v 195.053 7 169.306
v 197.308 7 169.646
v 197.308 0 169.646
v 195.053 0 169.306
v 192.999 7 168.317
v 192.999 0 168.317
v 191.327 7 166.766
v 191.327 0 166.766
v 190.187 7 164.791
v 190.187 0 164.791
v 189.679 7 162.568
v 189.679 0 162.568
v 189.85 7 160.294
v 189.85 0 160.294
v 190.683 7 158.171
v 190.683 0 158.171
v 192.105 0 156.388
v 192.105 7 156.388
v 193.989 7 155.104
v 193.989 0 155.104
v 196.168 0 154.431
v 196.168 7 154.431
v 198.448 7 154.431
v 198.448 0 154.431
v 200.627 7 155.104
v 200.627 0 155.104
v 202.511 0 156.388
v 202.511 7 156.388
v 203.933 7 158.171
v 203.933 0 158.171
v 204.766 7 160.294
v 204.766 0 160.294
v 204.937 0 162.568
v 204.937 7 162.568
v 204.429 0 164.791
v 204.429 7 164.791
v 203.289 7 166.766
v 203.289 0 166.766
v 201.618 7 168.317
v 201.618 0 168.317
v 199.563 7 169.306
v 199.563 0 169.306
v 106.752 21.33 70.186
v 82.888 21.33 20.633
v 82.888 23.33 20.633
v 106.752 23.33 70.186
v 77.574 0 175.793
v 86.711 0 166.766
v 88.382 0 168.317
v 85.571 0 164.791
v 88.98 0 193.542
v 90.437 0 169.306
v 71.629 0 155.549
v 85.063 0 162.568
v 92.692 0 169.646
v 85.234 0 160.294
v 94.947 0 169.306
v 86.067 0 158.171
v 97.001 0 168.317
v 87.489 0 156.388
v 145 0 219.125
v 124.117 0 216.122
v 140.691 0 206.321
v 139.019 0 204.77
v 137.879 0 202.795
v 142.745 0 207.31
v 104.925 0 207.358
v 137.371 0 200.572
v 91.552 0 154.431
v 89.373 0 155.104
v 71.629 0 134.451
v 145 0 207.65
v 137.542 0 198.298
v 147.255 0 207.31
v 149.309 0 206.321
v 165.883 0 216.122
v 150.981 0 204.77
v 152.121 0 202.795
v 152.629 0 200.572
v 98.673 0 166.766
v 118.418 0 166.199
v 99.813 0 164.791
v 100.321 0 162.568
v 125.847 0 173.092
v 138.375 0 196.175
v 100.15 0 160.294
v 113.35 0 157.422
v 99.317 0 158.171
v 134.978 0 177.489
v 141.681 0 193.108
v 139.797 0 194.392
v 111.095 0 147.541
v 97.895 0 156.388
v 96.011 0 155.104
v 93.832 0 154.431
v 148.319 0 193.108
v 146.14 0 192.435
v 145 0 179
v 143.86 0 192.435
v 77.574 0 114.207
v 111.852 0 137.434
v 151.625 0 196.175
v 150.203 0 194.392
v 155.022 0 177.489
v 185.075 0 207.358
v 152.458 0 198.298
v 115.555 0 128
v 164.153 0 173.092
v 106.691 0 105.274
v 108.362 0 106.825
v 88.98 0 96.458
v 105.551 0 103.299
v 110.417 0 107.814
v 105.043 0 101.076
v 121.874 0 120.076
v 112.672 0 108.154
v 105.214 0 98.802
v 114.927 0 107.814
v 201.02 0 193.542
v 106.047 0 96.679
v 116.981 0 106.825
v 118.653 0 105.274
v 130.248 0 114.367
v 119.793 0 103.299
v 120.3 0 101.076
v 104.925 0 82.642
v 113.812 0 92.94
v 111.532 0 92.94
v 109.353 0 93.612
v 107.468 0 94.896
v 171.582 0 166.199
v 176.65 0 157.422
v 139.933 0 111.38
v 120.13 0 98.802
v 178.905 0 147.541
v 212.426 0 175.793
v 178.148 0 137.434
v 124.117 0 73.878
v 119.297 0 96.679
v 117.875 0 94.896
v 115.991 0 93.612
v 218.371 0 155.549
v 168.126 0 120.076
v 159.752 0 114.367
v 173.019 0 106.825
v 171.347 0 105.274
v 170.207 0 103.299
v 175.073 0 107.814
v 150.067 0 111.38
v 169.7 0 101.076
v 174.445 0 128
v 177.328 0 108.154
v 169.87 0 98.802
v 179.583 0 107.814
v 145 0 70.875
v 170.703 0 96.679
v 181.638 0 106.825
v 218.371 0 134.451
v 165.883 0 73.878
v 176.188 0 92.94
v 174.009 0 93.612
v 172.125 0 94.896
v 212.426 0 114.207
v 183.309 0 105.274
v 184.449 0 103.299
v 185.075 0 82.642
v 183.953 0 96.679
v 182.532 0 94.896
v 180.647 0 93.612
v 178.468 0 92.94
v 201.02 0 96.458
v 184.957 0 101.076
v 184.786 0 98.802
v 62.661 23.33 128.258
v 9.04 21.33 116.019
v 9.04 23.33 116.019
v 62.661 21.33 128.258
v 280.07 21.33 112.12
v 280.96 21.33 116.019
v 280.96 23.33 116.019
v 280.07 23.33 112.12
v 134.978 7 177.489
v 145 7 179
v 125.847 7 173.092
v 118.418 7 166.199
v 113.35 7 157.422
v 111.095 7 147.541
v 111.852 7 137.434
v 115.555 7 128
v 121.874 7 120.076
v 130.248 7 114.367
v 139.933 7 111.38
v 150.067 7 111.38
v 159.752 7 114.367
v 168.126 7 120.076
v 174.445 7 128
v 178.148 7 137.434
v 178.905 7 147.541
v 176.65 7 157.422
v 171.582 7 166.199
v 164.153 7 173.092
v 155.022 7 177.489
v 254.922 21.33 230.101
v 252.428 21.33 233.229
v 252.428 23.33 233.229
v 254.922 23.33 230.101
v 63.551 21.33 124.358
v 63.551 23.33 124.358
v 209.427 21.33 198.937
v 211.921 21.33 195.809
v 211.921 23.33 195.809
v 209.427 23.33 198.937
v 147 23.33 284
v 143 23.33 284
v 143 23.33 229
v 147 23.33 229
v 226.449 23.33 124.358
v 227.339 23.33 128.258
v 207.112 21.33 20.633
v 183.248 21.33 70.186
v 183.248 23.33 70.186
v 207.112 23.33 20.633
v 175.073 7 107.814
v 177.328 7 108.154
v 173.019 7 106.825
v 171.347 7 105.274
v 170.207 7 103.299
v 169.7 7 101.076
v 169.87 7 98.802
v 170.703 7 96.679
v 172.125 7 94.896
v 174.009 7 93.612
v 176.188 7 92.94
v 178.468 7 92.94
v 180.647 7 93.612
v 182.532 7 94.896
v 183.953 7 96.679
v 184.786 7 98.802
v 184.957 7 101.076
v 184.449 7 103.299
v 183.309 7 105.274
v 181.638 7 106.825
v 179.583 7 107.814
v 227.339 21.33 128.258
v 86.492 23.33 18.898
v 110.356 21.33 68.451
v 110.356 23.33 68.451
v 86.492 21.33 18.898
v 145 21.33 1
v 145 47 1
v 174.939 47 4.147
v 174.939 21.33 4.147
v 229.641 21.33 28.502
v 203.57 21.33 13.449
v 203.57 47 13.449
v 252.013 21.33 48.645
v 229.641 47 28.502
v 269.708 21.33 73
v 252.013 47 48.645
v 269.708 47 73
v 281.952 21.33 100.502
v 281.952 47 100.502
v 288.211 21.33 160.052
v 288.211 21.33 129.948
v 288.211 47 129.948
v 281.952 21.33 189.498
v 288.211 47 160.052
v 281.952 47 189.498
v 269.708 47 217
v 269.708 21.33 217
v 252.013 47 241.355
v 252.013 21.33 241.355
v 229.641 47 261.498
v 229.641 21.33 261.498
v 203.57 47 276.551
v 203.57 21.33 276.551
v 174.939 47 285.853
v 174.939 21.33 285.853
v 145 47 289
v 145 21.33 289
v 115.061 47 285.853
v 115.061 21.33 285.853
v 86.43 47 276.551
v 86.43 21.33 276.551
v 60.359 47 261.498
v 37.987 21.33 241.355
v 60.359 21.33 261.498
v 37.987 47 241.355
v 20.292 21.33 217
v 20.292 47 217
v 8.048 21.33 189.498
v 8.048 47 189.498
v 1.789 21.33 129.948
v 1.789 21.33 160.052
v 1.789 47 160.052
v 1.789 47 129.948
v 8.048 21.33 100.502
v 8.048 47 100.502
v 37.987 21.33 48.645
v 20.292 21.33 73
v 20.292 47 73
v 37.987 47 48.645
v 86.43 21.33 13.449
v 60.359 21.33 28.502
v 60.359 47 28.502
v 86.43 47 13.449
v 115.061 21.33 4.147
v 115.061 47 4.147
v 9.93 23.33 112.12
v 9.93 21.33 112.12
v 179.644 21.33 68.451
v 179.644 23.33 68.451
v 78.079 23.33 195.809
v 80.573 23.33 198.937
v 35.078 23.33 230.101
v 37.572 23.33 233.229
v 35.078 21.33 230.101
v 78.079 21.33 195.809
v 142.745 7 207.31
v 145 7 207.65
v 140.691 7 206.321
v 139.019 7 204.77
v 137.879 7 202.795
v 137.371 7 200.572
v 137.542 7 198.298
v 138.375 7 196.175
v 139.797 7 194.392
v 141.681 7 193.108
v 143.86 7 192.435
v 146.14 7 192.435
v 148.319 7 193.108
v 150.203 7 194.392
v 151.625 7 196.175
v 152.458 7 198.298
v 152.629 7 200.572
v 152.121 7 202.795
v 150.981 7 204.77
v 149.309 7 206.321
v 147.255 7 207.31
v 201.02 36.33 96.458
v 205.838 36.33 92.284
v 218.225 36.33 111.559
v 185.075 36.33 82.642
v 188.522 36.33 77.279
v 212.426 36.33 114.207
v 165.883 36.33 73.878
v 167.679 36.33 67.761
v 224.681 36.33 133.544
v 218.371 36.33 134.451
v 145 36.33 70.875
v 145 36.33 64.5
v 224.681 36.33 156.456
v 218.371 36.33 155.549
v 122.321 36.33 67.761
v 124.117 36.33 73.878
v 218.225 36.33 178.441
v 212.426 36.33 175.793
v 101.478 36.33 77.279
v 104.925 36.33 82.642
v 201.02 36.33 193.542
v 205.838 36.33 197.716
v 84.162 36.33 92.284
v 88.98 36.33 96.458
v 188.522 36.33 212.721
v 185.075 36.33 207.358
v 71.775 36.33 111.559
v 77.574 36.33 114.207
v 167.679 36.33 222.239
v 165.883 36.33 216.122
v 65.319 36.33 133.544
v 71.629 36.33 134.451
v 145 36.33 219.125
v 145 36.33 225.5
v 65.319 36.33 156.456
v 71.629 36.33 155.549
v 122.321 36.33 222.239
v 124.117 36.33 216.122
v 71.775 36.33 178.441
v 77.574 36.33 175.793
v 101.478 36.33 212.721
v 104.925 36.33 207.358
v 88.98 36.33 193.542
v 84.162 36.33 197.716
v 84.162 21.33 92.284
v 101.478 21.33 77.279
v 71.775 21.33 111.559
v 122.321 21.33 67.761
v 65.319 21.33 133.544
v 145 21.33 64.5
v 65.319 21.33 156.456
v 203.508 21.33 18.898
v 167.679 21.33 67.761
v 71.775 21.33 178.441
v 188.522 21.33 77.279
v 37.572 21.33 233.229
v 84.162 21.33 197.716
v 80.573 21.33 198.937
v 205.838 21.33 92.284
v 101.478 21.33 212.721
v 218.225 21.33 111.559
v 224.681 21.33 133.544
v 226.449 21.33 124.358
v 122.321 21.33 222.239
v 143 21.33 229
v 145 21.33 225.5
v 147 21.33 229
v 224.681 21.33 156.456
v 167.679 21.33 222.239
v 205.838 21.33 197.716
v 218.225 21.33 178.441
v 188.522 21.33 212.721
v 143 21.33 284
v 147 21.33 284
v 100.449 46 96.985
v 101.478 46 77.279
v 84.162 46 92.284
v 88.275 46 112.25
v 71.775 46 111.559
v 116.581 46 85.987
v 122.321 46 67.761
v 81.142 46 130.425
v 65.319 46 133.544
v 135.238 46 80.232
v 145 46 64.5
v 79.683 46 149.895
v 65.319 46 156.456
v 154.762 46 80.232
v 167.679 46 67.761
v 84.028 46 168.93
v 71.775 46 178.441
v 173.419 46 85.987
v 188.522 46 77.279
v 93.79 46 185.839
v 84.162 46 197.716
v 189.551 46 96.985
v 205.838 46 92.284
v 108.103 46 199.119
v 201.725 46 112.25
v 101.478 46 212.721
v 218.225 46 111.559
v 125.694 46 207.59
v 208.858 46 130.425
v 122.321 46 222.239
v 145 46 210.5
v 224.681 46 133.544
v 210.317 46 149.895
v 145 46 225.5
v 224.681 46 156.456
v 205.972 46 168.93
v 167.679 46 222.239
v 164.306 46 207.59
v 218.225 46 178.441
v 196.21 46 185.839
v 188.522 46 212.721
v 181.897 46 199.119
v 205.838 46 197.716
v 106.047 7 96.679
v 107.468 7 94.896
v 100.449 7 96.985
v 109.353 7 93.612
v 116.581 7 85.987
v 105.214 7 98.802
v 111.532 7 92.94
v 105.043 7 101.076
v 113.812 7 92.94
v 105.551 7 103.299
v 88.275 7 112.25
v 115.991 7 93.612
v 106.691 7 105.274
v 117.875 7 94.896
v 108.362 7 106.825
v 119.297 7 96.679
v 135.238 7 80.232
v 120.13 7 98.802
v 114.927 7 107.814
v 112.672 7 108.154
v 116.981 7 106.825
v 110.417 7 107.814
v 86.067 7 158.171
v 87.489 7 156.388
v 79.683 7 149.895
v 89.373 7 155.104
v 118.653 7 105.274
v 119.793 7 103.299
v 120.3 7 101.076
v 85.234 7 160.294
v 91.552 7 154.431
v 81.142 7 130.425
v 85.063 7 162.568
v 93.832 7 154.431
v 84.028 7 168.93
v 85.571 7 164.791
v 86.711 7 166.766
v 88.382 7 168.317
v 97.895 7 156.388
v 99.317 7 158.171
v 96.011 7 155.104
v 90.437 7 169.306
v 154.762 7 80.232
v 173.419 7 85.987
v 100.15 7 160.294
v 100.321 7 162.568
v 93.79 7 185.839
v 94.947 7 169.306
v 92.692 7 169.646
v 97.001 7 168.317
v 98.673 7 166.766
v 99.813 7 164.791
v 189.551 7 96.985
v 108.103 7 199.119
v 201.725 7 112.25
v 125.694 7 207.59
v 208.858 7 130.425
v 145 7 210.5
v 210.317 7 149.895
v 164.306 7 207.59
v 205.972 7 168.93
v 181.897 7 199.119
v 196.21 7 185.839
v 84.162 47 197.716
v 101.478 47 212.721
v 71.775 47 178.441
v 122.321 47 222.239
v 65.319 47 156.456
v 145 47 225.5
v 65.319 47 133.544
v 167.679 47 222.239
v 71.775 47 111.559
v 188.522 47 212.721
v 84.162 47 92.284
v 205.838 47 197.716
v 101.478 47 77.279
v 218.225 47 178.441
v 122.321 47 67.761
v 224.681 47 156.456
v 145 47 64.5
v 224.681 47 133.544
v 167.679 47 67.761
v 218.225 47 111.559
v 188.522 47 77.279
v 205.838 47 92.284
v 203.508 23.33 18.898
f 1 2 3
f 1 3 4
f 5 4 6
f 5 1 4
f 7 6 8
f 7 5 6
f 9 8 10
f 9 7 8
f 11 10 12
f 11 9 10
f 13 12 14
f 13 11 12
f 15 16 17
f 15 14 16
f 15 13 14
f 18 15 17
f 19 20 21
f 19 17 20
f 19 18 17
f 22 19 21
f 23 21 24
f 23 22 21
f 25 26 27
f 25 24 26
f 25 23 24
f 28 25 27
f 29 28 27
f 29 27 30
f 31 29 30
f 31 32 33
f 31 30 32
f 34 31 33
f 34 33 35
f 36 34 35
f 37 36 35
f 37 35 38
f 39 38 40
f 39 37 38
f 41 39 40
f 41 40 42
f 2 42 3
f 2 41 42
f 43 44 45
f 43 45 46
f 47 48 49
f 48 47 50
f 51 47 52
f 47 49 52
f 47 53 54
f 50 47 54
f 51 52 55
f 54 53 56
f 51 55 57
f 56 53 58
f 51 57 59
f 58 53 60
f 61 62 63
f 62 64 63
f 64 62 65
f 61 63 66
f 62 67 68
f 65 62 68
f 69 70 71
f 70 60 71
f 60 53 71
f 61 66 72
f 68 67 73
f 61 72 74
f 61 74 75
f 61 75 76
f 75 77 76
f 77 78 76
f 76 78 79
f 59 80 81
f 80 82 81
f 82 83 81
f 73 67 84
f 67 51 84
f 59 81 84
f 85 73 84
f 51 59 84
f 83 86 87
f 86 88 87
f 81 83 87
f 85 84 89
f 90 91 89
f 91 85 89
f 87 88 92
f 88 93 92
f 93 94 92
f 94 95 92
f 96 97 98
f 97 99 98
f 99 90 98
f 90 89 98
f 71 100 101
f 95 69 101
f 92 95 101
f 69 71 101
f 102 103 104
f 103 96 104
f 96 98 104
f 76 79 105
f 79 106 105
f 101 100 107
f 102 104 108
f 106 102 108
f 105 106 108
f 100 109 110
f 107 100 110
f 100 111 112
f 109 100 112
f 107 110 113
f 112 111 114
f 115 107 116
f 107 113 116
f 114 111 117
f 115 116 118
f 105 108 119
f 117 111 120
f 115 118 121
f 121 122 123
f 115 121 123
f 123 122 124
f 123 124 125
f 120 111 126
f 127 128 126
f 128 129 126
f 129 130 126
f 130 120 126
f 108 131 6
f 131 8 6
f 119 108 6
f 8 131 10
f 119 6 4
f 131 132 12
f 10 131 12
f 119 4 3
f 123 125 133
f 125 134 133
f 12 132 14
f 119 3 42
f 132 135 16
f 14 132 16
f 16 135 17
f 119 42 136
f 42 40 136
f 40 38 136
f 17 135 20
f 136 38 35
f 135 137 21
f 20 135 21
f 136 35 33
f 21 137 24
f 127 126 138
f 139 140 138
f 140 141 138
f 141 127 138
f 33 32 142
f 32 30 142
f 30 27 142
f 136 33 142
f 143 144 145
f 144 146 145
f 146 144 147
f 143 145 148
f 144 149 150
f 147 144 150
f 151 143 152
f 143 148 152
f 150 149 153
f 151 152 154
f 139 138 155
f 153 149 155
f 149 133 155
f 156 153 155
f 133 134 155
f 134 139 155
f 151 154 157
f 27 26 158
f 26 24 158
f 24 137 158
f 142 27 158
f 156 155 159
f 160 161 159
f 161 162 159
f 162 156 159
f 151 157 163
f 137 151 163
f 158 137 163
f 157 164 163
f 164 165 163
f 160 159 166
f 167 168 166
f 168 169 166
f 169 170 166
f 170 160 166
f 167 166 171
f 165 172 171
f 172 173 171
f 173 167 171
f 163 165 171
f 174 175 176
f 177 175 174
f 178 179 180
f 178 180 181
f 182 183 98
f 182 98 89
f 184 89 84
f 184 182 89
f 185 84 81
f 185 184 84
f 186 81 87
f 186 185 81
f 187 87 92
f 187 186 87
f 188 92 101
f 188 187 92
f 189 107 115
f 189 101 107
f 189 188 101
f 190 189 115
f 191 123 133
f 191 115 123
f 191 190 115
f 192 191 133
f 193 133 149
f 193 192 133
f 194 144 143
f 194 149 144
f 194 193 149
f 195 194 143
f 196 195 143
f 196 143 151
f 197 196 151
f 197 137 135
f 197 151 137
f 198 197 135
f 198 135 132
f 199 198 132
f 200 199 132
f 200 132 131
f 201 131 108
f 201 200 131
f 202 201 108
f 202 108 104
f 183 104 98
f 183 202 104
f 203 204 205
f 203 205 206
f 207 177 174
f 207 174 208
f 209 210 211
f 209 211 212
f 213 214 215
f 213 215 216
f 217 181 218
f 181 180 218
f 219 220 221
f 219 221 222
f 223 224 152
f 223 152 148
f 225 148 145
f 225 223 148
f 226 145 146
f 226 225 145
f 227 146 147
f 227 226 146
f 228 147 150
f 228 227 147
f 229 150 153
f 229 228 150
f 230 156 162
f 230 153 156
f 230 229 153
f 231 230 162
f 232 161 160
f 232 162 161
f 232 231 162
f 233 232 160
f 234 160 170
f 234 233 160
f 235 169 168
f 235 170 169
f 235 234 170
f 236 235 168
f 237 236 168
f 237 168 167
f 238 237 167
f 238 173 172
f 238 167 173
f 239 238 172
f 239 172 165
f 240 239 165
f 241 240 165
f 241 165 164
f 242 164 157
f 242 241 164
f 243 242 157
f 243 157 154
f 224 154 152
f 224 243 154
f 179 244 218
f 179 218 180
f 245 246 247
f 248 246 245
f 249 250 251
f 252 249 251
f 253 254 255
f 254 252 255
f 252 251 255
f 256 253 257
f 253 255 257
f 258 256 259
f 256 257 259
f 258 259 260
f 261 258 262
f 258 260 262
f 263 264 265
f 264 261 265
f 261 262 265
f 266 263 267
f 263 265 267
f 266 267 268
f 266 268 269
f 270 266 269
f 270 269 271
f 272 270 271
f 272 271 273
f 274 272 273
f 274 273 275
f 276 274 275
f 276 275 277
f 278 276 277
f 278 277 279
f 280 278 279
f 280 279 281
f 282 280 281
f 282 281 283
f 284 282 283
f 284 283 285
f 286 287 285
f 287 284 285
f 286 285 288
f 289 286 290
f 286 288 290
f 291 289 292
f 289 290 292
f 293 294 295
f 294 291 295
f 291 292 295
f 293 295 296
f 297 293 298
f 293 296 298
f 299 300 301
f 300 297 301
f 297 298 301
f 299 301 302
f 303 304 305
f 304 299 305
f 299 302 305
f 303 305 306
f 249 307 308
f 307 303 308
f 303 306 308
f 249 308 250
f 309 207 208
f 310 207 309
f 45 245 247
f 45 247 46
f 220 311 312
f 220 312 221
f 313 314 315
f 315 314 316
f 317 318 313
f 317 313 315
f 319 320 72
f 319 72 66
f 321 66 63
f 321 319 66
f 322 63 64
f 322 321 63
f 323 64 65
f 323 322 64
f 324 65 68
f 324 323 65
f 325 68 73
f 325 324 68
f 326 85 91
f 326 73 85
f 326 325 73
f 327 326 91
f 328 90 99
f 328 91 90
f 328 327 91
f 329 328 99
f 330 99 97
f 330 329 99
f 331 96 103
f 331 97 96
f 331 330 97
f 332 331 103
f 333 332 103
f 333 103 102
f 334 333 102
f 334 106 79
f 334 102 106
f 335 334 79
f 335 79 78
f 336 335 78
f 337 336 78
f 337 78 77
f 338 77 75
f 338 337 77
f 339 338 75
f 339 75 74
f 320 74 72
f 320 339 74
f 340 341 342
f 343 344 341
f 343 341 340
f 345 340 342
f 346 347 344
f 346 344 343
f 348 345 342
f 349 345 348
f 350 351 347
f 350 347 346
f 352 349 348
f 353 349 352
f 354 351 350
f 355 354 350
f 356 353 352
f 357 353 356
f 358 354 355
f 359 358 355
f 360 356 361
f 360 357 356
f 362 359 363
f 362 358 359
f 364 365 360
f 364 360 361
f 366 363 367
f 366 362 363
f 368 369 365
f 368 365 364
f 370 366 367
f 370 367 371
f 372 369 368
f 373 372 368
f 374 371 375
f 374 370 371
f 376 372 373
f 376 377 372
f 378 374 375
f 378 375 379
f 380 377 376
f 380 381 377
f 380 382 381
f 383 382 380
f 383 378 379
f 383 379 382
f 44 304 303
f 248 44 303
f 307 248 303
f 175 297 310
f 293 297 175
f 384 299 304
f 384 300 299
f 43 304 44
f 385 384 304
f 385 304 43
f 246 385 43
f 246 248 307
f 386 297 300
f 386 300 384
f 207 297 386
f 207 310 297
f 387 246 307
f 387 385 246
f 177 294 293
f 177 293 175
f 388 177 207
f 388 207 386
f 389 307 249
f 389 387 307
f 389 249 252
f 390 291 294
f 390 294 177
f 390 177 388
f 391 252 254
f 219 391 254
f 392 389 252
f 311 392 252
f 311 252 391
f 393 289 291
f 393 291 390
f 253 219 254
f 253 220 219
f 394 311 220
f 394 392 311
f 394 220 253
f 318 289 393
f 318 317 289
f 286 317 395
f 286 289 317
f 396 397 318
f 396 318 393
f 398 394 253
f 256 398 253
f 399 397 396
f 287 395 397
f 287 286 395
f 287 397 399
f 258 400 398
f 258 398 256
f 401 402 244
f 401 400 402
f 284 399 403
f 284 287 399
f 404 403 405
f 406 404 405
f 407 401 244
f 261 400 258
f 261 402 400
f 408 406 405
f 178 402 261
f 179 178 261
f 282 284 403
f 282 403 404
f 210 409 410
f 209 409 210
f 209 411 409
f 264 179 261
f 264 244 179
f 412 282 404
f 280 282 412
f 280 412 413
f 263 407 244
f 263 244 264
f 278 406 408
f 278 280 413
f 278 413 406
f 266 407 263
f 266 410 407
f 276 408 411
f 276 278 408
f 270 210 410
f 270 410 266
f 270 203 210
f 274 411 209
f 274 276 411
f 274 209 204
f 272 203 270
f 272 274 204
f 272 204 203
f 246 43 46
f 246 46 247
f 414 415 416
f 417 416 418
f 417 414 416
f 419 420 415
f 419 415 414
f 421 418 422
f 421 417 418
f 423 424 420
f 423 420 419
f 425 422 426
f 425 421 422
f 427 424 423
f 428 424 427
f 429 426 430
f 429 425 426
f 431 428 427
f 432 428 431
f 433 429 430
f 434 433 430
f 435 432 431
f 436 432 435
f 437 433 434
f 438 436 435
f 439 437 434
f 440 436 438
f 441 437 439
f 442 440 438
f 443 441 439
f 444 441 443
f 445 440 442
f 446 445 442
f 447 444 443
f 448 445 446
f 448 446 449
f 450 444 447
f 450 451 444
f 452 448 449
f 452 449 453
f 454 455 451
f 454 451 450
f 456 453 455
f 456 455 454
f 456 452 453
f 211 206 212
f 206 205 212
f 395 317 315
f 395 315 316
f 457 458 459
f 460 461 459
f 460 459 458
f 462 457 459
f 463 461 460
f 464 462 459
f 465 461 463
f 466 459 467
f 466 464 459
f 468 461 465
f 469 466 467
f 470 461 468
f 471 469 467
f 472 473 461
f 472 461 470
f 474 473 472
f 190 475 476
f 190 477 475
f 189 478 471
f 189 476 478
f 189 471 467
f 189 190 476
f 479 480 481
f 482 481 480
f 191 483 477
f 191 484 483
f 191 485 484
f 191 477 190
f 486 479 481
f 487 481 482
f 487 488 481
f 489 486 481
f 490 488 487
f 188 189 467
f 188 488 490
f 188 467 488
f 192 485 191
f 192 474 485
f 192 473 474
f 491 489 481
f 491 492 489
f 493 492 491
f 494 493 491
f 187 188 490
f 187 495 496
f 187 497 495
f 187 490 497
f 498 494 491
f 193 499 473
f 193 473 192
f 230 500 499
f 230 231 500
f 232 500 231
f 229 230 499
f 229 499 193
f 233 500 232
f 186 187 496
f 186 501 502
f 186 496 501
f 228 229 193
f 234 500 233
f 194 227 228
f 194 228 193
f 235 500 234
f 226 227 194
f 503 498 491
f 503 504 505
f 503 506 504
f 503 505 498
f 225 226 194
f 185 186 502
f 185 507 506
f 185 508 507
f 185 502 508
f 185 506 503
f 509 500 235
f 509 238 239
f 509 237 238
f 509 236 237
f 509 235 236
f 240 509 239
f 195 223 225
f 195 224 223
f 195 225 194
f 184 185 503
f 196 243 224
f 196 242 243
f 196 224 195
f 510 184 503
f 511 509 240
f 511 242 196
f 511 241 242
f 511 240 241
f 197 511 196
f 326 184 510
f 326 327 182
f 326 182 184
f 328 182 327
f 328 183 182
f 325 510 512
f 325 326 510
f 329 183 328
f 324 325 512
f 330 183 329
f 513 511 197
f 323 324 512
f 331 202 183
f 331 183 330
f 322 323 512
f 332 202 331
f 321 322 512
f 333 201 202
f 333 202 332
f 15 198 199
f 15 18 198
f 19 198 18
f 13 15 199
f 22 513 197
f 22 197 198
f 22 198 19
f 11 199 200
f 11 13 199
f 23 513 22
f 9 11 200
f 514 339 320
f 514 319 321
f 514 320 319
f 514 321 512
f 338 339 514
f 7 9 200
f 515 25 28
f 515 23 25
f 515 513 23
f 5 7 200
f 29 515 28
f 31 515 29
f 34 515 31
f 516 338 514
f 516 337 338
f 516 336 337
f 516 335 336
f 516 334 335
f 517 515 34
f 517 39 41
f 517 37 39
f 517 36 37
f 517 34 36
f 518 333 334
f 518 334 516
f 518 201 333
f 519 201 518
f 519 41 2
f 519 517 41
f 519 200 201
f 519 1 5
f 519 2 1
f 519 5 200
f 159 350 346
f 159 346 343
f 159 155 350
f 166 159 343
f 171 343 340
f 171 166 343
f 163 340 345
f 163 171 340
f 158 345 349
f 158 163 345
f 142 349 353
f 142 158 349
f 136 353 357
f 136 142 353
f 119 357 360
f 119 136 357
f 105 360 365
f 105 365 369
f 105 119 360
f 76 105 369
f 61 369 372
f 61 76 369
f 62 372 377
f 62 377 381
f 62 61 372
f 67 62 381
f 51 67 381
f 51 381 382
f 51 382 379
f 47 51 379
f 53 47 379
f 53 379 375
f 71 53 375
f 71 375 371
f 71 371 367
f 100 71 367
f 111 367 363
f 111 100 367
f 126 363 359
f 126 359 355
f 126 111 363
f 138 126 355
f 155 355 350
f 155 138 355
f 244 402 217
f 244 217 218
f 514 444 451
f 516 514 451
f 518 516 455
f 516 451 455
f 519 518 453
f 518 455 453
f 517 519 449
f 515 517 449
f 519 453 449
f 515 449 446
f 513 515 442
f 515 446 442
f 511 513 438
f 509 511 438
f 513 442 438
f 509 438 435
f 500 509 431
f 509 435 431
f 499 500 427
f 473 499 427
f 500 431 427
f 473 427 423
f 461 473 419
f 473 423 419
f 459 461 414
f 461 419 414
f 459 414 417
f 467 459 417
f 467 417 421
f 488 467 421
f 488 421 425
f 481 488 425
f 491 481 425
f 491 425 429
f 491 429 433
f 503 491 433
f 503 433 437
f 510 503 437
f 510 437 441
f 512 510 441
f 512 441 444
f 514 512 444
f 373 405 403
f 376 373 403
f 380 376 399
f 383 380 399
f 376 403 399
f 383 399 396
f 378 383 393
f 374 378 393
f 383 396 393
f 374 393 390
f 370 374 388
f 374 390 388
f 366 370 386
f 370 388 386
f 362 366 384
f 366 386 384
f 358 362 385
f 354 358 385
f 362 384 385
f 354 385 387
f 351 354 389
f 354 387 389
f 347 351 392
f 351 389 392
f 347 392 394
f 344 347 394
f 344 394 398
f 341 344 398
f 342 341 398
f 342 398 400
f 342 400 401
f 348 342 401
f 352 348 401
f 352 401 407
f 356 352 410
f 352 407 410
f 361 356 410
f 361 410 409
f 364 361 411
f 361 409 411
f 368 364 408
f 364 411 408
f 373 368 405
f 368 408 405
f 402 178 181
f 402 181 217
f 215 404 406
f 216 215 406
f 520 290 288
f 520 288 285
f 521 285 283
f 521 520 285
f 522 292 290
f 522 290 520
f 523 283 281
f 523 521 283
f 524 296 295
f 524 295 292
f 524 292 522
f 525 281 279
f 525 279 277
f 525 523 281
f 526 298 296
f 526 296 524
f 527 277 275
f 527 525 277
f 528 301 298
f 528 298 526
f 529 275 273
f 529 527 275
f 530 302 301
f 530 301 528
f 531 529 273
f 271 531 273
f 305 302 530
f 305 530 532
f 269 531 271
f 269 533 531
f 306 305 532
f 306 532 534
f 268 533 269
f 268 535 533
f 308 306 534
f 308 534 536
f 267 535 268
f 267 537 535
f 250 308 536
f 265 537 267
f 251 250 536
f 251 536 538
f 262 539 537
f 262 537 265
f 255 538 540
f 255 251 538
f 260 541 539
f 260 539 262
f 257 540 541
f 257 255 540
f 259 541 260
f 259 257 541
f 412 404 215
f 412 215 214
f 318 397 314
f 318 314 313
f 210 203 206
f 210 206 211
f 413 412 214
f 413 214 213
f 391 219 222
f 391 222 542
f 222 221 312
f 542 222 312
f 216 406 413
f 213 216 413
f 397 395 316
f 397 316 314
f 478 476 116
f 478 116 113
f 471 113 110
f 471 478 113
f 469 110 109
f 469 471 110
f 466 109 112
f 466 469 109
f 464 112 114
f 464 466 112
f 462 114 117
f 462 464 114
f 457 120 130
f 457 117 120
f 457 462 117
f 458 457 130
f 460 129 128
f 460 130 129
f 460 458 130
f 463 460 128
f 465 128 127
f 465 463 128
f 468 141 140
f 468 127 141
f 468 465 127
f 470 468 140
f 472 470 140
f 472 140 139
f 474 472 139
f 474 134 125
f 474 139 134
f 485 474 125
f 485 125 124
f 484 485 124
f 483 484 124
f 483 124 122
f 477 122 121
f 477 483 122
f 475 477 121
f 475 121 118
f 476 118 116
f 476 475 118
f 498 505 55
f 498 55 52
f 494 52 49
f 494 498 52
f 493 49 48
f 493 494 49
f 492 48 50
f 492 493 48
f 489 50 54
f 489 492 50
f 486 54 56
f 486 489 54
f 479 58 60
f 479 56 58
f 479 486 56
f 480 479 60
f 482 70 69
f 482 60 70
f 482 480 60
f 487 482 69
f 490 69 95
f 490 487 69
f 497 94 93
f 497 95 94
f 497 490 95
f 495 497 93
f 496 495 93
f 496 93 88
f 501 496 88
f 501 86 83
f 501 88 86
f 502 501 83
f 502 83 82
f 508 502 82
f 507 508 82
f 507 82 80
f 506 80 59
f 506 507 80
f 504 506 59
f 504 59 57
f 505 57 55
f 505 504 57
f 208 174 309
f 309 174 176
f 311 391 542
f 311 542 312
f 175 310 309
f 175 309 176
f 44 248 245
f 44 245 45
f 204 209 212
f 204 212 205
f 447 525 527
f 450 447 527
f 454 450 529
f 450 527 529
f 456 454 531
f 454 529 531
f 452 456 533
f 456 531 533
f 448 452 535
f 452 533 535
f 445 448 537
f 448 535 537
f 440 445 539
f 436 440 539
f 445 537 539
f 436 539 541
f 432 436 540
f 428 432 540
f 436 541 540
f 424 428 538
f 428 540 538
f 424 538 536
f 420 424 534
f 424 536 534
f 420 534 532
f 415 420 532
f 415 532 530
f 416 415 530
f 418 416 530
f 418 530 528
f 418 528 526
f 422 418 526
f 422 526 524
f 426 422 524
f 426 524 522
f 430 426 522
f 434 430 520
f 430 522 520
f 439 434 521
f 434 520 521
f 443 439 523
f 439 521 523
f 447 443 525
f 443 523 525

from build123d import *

# Parameters (mm, degrees)
SKETCH1_W               = 290
SKETCH1_H               = 290
BOSS_EXTRUDE1_DEPTH     = 47
SKETCH2_R               = 65.5
CUT_EXTRUDE1_DEPTH      = 40
SKETCH3_R               = 80.5
CUT_EXTRUDE2_DEPTH      = 1
SKETCH4_OUTSIDE_W       = 374.562
SKETCH4_OUTSIDE_H       = 374.562
SKETCH4_OUTSIDE_R       = 74.125
CUT_EXTRUDE3_DEPTH      = 21.33
CUT_EXTRUDE4_DEPTH      = 413.806249953
CUT_EXTRUDE4_DEPTH_BACK = 413.806249953
SKETCH5_R               = 34
CUT_EXTRUDE5_DEPTH      = 413.806249953
CUT_EXTRUDE5_DEPTH_BACK = 413.806249953
SKETCH6_R               = 7.65
SKETCH7_R               = 80.5
SKETCH7_R_2             = 74.125
CUT_EXTRUDE6_DEPTH      = 15
SKETCH8_W               = 4
SKETCH8_H               = 55
CUT_EXTRUDE7_DEPTH      = 2
CUT_EXTRUDE8_DEPTH      = 411.92450511
CUT_EXTRUDE8_DEPTH_BACK = 411.92450511
SKETCH9_OUTSIDE_W       = 374.562
SKETCH9_OUTSIDE_H       = 374.562
SKETCH9_OUTSIDE_R       = 144


with BuildPart() as part:
    # Sketch1 → Boss-Extrude1 (new body)
    with BuildSketch(Plane(origin=(0, 0, 0), x_dir=(1, 0, 0), z_dir=(0, 1, 0))):
        with Locations((145, -145)):
            Rectangle(SKETCH1_W, SKETCH1_H)
    extrude(amount=BOSS_EXTRUDE1_DEPTH)

    # Sketch2 → Cut-Extrude1 (cut)
    with BuildSketch(Plane(origin=(0, 47, 0), x_dir=(1, 0, 0), z_dir=(0, 1, 0))):
        with Locations(Location((145, -145, 0), (0, 0, 270))):
            Circle(SKETCH2_R)
    extrude(amount=-CUT_EXTRUDE1_DEPTH, mode=Mode.SUBTRACT)

    # Sketch3 → Cut-Extrude2 (cut)
    with BuildSketch(Plane(origin=(0, 47, 0), x_dir=(1, 0, 0), z_dir=(0, 1, 0))):
        with Locations(Location((145, -145, 0), (0, 0, 270))):
            Circle(SKETCH3_R)
    extrude(amount=-CUT_EXTRUDE2_DEPTH, mode=Mode.SUBTRACT)

    # Sketch4 outside → Cut-Extrude3 (cut)
    with BuildSketch(Plane.XZ):
        with Locations((145, 145)):
            Rectangle(SKETCH4_OUTSIDE_W, SKETCH4_OUTSIDE_H)
        with Locations(Location((145, 145, 0), (0, 0, 270))):
            Circle(SKETCH4_OUTSIDE_R, mode=Mode.SUBTRACT)
    extrude(amount=-CUT_EXTRUDE3_DEPTH, mode=Mode.SUBTRACT)

    # Sketch5 → Cut-Extrude4 (cut, two sides: drawn at the far end of the back side and taken through both)
    with BuildSketch(Plane.XZ.offset(-CUT_EXTRUDE4_DEPTH_BACK)):
        with Locations(Location((145, 145, 0), (0, 0, 90))):
            Circle(SKETCH5_R)
    extrude(amount=CUT_EXTRUDE4_DEPTH + CUT_EXTRUDE4_DEPTH_BACK, mode=Mode.SUBTRACT)

    # Sketch6 → Cut-Extrude5 (cut, two sides: drawn at the far end of the back side and taken through both)
    with BuildSketch(Plane.XZ.offset(-CUT_EXTRUDE5_DEPTH_BACK)):
        with Locations(Location((145, 200, 0), (0, 0, 90))):
            Circle(SKETCH6_R)
        with Locations(Location((197.308108396, 161.995934691, 0), (0, 0, 90))):
            Circle(SKETCH6_R)
        with Locations(Location((177.328188876, 100.504065309, 0), (0, 0, 90))):
            Circle(SKETCH6_R)
        with Locations(Location((112.671811124, 100.504065309, 0), (0, 0, 90))):
            Circle(SKETCH6_R)
        with Locations(Location((92.691891604, 161.995934691, 0), (0, 0, 90))):
            Circle(SKETCH6_R)
    extrude(amount=CUT_EXTRUDE5_DEPTH + CUT_EXTRUDE5_DEPTH_BACK, mode=Mode.SUBTRACT)

    # Sketch7 → Cut-Extrude6 (cut)
    with BuildSketch(Plane.XZ.offset(-21.33)):
        with Locations(Location((145, 145, 0), (0, 0, 90))):
            Circle(SKETCH7_R)
        with Locations(Location((145, 145, 0), (0, 0, 270))):
            Circle(SKETCH7_R_2, mode=Mode.SUBTRACT)
    extrude(amount=-CUT_EXTRUDE6_DEPTH, mode=Mode.SUBTRACT)

    # Sketch8 → Cut-Extrude7 (cut)
    with BuildSketch(Plane.XZ.offset(-21.33)):
        Polygon((254.921555667, 230.101419493), (211.920824131, 195.809480391), (209.426864924, 198.936806321), (252.427596459, 233.228745423), align=None)
        with Locations((145, 256.5)):
            Rectangle(SKETCH8_W, SKETCH8_H)
        Polygon((280.069937925, 112.119734356), (226.448902755, 124.358385723), (227.338986491, 128.258097372), (280.960021661, 116.019446004), align=None)
        Polygon((203.507902002, 18.897559883), (179.64429635, 68.450847618), (183.248171822, 70.186382574), (207.111777473, 20.63309484), align=None)
        Polygon((82.888222527, 20.63309484), (106.751828178, 70.186382574), (110.35570365, 68.450847618), (86.492097998, 18.897559883), align=None)
        Polygon((9.039978339, 116.019446004), (62.661013509, 128.258097372), (63.551097245, 124.358385723), (9.930062075, 112.119734356), align=None)
        Polygon((37.572403541, 233.228745423), (80.573135076, 198.936806321), (78.079175869, 195.809480391), (35.078444333, 230.101419493), align=None)
    extrude(amount=-CUT_EXTRUDE7_DEPTH, mode=Mode.SUBTRACT)

    # Sketch9 outside → Cut-Extrude8 (cut, two sides: drawn at the far end of the back side and taken through both)
    with BuildSketch(Plane.XZ.offset(-21.33).offset(-CUT_EXTRUDE8_DEPTH_BACK)):
        with Locations((145, 145)):
            Rectangle(SKETCH9_OUTSIDE_W, SKETCH9_OUTSIDE_H)
        with Locations(Location((145, 145, 0), (0, 0, 270))):
            Circle(SKETCH9_OUTSIDE_R, mode=Mode.SUBTRACT)
    extrude(amount=CUT_EXTRUDE8_DEPTH + CUT_EXTRUDE8_DEPTH_BACK, mode=Mode.SUBTRACT)


solid = part.part
